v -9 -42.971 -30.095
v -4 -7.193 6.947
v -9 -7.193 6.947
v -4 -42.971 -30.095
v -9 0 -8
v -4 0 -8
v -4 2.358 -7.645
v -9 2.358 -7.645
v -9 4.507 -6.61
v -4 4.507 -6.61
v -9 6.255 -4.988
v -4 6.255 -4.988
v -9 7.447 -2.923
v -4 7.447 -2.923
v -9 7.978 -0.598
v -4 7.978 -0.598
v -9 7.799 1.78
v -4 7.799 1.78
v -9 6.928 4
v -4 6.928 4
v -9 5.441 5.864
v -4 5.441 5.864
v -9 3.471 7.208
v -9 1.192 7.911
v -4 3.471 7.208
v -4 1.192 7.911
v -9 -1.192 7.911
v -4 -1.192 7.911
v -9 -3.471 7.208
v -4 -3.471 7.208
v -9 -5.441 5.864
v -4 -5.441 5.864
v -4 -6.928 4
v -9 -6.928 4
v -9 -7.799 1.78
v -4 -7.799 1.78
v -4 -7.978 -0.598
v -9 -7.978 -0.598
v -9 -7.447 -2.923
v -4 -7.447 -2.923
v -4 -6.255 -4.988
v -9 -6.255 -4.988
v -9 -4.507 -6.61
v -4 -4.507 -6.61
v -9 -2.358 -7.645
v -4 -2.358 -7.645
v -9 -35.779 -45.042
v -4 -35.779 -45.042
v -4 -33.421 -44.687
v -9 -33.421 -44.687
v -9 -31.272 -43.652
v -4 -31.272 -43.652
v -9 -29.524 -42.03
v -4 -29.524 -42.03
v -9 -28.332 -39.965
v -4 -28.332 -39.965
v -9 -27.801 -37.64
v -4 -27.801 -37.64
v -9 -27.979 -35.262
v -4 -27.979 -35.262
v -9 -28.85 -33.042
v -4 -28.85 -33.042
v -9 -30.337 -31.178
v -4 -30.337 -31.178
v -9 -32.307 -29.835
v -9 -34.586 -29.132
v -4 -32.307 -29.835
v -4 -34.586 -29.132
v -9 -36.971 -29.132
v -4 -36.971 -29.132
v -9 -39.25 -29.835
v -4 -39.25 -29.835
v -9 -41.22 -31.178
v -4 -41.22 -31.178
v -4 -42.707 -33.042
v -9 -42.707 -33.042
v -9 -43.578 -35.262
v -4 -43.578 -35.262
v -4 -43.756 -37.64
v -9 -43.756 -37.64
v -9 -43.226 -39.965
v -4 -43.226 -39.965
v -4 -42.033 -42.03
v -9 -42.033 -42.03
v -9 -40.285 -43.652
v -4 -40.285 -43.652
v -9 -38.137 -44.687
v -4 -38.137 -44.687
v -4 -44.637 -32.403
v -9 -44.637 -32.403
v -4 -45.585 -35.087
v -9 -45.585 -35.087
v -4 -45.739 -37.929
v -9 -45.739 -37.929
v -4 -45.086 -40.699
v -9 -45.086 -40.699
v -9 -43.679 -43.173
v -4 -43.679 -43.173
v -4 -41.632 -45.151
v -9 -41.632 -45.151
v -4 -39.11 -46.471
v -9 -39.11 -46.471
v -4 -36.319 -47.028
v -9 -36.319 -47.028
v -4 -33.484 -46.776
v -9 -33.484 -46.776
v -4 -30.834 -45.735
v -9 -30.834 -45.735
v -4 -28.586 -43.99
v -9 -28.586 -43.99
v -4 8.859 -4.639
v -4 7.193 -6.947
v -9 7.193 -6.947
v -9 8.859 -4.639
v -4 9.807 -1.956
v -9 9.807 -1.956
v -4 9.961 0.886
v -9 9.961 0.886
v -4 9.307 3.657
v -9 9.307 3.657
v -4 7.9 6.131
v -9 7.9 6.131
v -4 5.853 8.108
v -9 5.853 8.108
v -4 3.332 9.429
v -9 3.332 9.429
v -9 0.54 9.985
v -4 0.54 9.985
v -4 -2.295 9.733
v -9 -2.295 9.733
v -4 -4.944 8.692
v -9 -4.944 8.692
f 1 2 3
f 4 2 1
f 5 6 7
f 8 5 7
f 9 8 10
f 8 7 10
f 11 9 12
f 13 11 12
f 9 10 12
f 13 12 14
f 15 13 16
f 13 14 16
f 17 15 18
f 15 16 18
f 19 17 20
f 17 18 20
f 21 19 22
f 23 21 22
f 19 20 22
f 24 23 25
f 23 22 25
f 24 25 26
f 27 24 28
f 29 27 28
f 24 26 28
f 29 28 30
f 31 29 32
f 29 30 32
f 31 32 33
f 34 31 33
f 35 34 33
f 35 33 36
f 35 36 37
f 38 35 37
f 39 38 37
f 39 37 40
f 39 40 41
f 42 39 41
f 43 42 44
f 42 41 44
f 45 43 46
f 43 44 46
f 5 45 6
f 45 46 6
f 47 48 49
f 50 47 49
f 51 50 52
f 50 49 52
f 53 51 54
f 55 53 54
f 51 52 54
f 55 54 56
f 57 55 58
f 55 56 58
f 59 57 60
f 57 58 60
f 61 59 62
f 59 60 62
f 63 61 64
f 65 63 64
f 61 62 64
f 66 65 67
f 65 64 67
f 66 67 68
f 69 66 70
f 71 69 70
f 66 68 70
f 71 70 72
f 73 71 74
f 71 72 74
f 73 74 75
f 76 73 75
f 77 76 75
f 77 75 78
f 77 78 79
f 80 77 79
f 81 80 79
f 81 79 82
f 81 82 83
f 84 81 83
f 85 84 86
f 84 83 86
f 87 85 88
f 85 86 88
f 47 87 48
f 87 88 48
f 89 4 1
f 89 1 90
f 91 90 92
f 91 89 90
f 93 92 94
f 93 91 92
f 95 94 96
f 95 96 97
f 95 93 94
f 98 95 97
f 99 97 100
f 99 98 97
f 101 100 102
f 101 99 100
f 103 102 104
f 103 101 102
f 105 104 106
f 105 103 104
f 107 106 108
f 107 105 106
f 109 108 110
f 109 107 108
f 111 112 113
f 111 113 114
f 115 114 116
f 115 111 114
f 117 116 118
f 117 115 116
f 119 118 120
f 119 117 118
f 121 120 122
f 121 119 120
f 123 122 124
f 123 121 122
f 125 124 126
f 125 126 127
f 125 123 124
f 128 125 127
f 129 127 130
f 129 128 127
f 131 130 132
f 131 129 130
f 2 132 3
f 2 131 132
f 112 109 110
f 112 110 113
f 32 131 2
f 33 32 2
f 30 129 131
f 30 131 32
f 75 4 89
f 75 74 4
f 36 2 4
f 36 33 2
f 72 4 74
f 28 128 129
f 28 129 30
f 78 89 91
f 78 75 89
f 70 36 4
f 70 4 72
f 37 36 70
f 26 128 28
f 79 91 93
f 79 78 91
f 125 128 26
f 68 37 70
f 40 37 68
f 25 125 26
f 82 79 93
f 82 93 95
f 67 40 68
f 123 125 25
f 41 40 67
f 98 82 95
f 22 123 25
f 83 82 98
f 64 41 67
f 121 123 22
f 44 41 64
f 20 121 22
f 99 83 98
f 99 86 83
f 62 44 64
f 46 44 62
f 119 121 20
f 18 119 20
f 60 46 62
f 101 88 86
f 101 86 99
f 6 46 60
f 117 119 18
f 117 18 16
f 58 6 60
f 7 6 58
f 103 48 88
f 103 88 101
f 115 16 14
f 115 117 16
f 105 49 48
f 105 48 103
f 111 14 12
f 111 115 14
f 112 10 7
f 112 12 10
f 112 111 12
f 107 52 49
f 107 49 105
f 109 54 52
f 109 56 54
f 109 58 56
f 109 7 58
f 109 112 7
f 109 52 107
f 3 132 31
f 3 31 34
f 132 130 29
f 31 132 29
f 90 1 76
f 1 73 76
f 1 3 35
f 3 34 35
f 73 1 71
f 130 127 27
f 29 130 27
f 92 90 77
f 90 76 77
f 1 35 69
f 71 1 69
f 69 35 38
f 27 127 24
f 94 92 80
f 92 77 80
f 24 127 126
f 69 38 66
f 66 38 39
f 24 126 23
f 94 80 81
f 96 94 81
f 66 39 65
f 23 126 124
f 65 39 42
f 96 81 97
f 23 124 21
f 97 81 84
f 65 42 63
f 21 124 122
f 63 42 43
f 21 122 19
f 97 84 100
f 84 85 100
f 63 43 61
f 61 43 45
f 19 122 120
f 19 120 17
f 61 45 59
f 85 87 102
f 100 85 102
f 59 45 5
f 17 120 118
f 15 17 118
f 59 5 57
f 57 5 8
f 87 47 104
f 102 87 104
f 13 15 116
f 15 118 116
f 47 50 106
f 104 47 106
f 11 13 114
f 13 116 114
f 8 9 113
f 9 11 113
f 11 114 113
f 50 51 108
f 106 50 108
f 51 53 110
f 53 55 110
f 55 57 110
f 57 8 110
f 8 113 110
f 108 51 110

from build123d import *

# Parameters (mm, degrees)
BOSS_EXTRUDE1_START = -4
SKETCH2_R           = 8
BOSS_EXTRUDE1_DEPTH = 5


with BuildPart() as part:
    # Sketch2 → Boss-Extrude1 (new body)
    with BuildSketch(Plane(origin=(0, 0, 0), x_dir=(0, 0, -1), z_dir=(1, 0, 0)).offset(BOSS_EXTRUDE1_START)):
        with BuildLine():
            Line((43.989770311, -28.585837543), (6.947291622, 7.192714309))
            ThreePointArc((6.947291622, 7.192714309), (-7.192714309, 6.947291622), (-6.947291622, -7.192714309))
            Line((-6.947291622, -7.192714309), (30.095187067, -42.97126616))
            ThreePointArc((30.095187067, -42.97126616), (44.235192998, -42.725843473), (43.989770311, -28.585837543))
        make_face()
        with Locations((37.042478689, -35.778551851)):
            Circle(SKETCH2_R, mode=Mode.SUBTRACT)
        Circle(SKETCH2_R, mode=Mode.SUBTRACT)
    extrude(amount=-BOSS_EXTRUDE1_DEPTH)


solid = part.part
